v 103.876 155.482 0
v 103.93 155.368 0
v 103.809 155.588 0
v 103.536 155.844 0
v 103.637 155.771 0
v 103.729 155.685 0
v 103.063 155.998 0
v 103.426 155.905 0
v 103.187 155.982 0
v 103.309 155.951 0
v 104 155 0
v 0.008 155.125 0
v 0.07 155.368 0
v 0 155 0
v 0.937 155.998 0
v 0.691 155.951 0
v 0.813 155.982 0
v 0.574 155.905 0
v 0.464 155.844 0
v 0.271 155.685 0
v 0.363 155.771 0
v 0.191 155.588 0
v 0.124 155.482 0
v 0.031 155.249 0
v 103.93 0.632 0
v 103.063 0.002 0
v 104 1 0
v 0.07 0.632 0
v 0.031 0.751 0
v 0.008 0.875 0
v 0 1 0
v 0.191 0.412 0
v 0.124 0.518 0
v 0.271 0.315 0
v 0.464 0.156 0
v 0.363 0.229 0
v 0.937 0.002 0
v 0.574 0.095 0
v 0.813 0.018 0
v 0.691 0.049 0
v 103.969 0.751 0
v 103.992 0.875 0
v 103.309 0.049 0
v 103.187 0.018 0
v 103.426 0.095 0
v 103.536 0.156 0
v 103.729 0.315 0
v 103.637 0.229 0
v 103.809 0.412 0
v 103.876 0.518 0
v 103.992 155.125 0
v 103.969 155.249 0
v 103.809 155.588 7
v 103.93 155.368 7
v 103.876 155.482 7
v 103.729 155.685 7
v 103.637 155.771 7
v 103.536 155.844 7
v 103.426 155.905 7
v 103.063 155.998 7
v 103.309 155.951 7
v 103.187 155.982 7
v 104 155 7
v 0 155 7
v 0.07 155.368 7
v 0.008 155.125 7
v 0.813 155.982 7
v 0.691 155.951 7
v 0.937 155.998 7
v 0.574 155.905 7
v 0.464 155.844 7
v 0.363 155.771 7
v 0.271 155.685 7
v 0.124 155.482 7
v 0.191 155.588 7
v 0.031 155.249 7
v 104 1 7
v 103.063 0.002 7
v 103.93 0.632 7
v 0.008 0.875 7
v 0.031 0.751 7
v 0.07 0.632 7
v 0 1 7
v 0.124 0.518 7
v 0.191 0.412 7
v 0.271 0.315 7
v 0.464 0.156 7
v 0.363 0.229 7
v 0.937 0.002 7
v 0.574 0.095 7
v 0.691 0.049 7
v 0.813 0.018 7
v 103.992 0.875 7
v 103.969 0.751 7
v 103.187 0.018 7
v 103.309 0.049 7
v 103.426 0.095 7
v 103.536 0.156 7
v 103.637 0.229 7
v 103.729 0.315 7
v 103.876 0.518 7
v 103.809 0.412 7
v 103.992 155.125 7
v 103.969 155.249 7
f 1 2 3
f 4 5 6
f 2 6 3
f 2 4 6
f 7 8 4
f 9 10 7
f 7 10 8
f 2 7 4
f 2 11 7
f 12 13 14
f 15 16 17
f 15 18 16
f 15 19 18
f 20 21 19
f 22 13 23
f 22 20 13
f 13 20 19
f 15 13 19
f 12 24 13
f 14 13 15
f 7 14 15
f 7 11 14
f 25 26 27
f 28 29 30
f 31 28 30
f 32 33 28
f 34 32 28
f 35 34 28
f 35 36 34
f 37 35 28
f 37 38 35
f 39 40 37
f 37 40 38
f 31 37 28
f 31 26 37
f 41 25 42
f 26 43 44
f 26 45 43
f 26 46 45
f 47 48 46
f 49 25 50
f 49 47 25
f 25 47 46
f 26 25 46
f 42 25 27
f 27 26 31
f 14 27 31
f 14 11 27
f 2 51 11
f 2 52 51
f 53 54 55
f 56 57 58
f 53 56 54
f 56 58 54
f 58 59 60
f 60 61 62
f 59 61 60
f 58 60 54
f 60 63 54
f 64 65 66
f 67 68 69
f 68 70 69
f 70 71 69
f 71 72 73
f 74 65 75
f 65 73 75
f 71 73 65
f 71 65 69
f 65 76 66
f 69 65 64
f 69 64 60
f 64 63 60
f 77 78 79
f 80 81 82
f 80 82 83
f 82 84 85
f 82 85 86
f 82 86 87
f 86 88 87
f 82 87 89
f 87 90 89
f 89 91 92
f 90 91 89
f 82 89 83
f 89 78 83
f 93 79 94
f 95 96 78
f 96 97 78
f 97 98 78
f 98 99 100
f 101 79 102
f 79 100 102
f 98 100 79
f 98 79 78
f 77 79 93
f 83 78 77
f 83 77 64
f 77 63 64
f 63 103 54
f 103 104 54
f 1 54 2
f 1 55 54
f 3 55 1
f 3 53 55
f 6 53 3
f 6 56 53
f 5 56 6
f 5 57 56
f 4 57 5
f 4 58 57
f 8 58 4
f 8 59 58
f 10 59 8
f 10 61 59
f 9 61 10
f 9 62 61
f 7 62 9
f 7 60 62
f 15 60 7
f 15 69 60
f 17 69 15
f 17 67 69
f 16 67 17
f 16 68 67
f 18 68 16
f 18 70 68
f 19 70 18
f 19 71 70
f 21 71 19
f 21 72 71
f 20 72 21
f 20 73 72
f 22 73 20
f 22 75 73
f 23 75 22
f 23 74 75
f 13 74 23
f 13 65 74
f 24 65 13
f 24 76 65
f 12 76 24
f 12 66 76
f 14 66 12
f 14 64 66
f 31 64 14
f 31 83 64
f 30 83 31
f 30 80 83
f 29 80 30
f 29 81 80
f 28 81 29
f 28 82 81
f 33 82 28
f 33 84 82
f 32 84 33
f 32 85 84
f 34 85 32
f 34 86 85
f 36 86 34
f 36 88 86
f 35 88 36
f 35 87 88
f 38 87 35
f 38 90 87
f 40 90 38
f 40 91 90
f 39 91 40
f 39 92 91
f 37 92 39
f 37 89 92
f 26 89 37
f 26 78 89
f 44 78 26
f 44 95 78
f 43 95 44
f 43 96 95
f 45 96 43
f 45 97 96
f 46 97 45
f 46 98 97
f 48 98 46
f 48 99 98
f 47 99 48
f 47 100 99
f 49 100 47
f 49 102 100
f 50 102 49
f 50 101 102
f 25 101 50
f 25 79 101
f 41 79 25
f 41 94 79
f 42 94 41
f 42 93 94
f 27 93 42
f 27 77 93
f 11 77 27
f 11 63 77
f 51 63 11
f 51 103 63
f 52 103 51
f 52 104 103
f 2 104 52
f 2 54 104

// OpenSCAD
// file: ../../lib/primitive/rounded_square.scad
$bleed = 1;
$rounding = 3;

module rounded_square(size, flat_top=false, flat_bottom=false) {
  assert(!(flat_top && flat_bottom), "Flat top and flat bottom are exclusive");

  rounding_height = flat_top || flat_bottom 
    ? $rounding 
    : $rounding * 2;

  offset = flat_bottom ? 0 : $rounding;

  inner_size = [
    size[0] - $rounding * 2,
    size[1] - rounding_height,
  ];

  minkowski() {
    translate([$rounding, offset]) {
      square(inner_size);
    }
    if (flat_top ) {
      difference() {
        circle($rounding);
        translate([-$rounding, 0]) {
          square([$rounding * 2, $rounding]);
        }
      }
    } else if (flat_bottom) {
      difference() {
        circle($rounding);
        translate([-$rounding, -$rounding]) {
          square([$rounding * 2, $rounding]);
        }
      }
    } else {
      circle($rounding);
    }
  }
}
// file: ../../lib/primitive/rounded_cube.scad
include <./rounded_square.scad>

$bleed = 1;
$rounding = 3;

// Render a rounded cube
// flat_top: do not round the top edges
// flat_bottom: do not round the bottom edges
// flat: equals flat_top && flat_bottom
// 
// Limitations:
// requires height > $rounding * 2
// flat_top || flat_bottom requires height > $rounding
// flat_top && flat_bottom requires height > $bleed
module rounded_cube(
  size, 
  flat=false, 
  flat_top=false, 
  flat_bottom=false,
  side_rounding=-1
) {
  _flat = flat || (flat_top && flat_bottom);
  _flat_top = flat_top || flat;
  _flat_bottom = flat_bottom || flat;
  _rounding = min($rounding, size[2] / 2);
  _side_rounding = side_rounding > -1 ? side_rounding: $rounding;

  assert(_side_rounding >= $rounding, "side rounding cannot be less than rounding");

  top_height = _flat_top ? 0: _rounding;
  bottom_height = _flat_bottom ? 0: _rounding;

  cube_size = [
    size[0] - _rounding * 2,
    size[1] - _rounding * 2,
    size[2] - (top_height + bottom_height)
  ];

  if (_flat_top && _flat_bottom) {
     linear_extrude(cube_size[2]) {
       rounded_square([size[0], size[1]]);
     }
   } else {
     minkowski() {
       translate([_rounding, _rounding, bottom_height]) {
         if (_side_rounding != _rounding) {
           linear_extrude(cube_size[2]) {
             rounded_square([cube_size[0], cube_size[1]], $rounding=_side_rounding);
           }
         } else {
           cube(cube_size);
         }
       }

       if (_flat_top) {
         difference() {
           sphere(_rounding);
           cylinder(_rounding, _rounding, _rounding);
         }
       } else if (_flat_bottom) {
         difference() {
           sphere(_rounding);
           translate ([0, 0, -_rounding]) {
             cylinder(_rounding, _rounding, _rounding);
           }
         }
       } else {
         sphere(_rounding);
       }
    }
  }
}
// main file
include <../../lib/primitive/rounded_cube.scad>

$fn = 50;
$rounding = 1;

size = [
  104,
  156,
  7,
];

rounded_cube(size, flat=true);
